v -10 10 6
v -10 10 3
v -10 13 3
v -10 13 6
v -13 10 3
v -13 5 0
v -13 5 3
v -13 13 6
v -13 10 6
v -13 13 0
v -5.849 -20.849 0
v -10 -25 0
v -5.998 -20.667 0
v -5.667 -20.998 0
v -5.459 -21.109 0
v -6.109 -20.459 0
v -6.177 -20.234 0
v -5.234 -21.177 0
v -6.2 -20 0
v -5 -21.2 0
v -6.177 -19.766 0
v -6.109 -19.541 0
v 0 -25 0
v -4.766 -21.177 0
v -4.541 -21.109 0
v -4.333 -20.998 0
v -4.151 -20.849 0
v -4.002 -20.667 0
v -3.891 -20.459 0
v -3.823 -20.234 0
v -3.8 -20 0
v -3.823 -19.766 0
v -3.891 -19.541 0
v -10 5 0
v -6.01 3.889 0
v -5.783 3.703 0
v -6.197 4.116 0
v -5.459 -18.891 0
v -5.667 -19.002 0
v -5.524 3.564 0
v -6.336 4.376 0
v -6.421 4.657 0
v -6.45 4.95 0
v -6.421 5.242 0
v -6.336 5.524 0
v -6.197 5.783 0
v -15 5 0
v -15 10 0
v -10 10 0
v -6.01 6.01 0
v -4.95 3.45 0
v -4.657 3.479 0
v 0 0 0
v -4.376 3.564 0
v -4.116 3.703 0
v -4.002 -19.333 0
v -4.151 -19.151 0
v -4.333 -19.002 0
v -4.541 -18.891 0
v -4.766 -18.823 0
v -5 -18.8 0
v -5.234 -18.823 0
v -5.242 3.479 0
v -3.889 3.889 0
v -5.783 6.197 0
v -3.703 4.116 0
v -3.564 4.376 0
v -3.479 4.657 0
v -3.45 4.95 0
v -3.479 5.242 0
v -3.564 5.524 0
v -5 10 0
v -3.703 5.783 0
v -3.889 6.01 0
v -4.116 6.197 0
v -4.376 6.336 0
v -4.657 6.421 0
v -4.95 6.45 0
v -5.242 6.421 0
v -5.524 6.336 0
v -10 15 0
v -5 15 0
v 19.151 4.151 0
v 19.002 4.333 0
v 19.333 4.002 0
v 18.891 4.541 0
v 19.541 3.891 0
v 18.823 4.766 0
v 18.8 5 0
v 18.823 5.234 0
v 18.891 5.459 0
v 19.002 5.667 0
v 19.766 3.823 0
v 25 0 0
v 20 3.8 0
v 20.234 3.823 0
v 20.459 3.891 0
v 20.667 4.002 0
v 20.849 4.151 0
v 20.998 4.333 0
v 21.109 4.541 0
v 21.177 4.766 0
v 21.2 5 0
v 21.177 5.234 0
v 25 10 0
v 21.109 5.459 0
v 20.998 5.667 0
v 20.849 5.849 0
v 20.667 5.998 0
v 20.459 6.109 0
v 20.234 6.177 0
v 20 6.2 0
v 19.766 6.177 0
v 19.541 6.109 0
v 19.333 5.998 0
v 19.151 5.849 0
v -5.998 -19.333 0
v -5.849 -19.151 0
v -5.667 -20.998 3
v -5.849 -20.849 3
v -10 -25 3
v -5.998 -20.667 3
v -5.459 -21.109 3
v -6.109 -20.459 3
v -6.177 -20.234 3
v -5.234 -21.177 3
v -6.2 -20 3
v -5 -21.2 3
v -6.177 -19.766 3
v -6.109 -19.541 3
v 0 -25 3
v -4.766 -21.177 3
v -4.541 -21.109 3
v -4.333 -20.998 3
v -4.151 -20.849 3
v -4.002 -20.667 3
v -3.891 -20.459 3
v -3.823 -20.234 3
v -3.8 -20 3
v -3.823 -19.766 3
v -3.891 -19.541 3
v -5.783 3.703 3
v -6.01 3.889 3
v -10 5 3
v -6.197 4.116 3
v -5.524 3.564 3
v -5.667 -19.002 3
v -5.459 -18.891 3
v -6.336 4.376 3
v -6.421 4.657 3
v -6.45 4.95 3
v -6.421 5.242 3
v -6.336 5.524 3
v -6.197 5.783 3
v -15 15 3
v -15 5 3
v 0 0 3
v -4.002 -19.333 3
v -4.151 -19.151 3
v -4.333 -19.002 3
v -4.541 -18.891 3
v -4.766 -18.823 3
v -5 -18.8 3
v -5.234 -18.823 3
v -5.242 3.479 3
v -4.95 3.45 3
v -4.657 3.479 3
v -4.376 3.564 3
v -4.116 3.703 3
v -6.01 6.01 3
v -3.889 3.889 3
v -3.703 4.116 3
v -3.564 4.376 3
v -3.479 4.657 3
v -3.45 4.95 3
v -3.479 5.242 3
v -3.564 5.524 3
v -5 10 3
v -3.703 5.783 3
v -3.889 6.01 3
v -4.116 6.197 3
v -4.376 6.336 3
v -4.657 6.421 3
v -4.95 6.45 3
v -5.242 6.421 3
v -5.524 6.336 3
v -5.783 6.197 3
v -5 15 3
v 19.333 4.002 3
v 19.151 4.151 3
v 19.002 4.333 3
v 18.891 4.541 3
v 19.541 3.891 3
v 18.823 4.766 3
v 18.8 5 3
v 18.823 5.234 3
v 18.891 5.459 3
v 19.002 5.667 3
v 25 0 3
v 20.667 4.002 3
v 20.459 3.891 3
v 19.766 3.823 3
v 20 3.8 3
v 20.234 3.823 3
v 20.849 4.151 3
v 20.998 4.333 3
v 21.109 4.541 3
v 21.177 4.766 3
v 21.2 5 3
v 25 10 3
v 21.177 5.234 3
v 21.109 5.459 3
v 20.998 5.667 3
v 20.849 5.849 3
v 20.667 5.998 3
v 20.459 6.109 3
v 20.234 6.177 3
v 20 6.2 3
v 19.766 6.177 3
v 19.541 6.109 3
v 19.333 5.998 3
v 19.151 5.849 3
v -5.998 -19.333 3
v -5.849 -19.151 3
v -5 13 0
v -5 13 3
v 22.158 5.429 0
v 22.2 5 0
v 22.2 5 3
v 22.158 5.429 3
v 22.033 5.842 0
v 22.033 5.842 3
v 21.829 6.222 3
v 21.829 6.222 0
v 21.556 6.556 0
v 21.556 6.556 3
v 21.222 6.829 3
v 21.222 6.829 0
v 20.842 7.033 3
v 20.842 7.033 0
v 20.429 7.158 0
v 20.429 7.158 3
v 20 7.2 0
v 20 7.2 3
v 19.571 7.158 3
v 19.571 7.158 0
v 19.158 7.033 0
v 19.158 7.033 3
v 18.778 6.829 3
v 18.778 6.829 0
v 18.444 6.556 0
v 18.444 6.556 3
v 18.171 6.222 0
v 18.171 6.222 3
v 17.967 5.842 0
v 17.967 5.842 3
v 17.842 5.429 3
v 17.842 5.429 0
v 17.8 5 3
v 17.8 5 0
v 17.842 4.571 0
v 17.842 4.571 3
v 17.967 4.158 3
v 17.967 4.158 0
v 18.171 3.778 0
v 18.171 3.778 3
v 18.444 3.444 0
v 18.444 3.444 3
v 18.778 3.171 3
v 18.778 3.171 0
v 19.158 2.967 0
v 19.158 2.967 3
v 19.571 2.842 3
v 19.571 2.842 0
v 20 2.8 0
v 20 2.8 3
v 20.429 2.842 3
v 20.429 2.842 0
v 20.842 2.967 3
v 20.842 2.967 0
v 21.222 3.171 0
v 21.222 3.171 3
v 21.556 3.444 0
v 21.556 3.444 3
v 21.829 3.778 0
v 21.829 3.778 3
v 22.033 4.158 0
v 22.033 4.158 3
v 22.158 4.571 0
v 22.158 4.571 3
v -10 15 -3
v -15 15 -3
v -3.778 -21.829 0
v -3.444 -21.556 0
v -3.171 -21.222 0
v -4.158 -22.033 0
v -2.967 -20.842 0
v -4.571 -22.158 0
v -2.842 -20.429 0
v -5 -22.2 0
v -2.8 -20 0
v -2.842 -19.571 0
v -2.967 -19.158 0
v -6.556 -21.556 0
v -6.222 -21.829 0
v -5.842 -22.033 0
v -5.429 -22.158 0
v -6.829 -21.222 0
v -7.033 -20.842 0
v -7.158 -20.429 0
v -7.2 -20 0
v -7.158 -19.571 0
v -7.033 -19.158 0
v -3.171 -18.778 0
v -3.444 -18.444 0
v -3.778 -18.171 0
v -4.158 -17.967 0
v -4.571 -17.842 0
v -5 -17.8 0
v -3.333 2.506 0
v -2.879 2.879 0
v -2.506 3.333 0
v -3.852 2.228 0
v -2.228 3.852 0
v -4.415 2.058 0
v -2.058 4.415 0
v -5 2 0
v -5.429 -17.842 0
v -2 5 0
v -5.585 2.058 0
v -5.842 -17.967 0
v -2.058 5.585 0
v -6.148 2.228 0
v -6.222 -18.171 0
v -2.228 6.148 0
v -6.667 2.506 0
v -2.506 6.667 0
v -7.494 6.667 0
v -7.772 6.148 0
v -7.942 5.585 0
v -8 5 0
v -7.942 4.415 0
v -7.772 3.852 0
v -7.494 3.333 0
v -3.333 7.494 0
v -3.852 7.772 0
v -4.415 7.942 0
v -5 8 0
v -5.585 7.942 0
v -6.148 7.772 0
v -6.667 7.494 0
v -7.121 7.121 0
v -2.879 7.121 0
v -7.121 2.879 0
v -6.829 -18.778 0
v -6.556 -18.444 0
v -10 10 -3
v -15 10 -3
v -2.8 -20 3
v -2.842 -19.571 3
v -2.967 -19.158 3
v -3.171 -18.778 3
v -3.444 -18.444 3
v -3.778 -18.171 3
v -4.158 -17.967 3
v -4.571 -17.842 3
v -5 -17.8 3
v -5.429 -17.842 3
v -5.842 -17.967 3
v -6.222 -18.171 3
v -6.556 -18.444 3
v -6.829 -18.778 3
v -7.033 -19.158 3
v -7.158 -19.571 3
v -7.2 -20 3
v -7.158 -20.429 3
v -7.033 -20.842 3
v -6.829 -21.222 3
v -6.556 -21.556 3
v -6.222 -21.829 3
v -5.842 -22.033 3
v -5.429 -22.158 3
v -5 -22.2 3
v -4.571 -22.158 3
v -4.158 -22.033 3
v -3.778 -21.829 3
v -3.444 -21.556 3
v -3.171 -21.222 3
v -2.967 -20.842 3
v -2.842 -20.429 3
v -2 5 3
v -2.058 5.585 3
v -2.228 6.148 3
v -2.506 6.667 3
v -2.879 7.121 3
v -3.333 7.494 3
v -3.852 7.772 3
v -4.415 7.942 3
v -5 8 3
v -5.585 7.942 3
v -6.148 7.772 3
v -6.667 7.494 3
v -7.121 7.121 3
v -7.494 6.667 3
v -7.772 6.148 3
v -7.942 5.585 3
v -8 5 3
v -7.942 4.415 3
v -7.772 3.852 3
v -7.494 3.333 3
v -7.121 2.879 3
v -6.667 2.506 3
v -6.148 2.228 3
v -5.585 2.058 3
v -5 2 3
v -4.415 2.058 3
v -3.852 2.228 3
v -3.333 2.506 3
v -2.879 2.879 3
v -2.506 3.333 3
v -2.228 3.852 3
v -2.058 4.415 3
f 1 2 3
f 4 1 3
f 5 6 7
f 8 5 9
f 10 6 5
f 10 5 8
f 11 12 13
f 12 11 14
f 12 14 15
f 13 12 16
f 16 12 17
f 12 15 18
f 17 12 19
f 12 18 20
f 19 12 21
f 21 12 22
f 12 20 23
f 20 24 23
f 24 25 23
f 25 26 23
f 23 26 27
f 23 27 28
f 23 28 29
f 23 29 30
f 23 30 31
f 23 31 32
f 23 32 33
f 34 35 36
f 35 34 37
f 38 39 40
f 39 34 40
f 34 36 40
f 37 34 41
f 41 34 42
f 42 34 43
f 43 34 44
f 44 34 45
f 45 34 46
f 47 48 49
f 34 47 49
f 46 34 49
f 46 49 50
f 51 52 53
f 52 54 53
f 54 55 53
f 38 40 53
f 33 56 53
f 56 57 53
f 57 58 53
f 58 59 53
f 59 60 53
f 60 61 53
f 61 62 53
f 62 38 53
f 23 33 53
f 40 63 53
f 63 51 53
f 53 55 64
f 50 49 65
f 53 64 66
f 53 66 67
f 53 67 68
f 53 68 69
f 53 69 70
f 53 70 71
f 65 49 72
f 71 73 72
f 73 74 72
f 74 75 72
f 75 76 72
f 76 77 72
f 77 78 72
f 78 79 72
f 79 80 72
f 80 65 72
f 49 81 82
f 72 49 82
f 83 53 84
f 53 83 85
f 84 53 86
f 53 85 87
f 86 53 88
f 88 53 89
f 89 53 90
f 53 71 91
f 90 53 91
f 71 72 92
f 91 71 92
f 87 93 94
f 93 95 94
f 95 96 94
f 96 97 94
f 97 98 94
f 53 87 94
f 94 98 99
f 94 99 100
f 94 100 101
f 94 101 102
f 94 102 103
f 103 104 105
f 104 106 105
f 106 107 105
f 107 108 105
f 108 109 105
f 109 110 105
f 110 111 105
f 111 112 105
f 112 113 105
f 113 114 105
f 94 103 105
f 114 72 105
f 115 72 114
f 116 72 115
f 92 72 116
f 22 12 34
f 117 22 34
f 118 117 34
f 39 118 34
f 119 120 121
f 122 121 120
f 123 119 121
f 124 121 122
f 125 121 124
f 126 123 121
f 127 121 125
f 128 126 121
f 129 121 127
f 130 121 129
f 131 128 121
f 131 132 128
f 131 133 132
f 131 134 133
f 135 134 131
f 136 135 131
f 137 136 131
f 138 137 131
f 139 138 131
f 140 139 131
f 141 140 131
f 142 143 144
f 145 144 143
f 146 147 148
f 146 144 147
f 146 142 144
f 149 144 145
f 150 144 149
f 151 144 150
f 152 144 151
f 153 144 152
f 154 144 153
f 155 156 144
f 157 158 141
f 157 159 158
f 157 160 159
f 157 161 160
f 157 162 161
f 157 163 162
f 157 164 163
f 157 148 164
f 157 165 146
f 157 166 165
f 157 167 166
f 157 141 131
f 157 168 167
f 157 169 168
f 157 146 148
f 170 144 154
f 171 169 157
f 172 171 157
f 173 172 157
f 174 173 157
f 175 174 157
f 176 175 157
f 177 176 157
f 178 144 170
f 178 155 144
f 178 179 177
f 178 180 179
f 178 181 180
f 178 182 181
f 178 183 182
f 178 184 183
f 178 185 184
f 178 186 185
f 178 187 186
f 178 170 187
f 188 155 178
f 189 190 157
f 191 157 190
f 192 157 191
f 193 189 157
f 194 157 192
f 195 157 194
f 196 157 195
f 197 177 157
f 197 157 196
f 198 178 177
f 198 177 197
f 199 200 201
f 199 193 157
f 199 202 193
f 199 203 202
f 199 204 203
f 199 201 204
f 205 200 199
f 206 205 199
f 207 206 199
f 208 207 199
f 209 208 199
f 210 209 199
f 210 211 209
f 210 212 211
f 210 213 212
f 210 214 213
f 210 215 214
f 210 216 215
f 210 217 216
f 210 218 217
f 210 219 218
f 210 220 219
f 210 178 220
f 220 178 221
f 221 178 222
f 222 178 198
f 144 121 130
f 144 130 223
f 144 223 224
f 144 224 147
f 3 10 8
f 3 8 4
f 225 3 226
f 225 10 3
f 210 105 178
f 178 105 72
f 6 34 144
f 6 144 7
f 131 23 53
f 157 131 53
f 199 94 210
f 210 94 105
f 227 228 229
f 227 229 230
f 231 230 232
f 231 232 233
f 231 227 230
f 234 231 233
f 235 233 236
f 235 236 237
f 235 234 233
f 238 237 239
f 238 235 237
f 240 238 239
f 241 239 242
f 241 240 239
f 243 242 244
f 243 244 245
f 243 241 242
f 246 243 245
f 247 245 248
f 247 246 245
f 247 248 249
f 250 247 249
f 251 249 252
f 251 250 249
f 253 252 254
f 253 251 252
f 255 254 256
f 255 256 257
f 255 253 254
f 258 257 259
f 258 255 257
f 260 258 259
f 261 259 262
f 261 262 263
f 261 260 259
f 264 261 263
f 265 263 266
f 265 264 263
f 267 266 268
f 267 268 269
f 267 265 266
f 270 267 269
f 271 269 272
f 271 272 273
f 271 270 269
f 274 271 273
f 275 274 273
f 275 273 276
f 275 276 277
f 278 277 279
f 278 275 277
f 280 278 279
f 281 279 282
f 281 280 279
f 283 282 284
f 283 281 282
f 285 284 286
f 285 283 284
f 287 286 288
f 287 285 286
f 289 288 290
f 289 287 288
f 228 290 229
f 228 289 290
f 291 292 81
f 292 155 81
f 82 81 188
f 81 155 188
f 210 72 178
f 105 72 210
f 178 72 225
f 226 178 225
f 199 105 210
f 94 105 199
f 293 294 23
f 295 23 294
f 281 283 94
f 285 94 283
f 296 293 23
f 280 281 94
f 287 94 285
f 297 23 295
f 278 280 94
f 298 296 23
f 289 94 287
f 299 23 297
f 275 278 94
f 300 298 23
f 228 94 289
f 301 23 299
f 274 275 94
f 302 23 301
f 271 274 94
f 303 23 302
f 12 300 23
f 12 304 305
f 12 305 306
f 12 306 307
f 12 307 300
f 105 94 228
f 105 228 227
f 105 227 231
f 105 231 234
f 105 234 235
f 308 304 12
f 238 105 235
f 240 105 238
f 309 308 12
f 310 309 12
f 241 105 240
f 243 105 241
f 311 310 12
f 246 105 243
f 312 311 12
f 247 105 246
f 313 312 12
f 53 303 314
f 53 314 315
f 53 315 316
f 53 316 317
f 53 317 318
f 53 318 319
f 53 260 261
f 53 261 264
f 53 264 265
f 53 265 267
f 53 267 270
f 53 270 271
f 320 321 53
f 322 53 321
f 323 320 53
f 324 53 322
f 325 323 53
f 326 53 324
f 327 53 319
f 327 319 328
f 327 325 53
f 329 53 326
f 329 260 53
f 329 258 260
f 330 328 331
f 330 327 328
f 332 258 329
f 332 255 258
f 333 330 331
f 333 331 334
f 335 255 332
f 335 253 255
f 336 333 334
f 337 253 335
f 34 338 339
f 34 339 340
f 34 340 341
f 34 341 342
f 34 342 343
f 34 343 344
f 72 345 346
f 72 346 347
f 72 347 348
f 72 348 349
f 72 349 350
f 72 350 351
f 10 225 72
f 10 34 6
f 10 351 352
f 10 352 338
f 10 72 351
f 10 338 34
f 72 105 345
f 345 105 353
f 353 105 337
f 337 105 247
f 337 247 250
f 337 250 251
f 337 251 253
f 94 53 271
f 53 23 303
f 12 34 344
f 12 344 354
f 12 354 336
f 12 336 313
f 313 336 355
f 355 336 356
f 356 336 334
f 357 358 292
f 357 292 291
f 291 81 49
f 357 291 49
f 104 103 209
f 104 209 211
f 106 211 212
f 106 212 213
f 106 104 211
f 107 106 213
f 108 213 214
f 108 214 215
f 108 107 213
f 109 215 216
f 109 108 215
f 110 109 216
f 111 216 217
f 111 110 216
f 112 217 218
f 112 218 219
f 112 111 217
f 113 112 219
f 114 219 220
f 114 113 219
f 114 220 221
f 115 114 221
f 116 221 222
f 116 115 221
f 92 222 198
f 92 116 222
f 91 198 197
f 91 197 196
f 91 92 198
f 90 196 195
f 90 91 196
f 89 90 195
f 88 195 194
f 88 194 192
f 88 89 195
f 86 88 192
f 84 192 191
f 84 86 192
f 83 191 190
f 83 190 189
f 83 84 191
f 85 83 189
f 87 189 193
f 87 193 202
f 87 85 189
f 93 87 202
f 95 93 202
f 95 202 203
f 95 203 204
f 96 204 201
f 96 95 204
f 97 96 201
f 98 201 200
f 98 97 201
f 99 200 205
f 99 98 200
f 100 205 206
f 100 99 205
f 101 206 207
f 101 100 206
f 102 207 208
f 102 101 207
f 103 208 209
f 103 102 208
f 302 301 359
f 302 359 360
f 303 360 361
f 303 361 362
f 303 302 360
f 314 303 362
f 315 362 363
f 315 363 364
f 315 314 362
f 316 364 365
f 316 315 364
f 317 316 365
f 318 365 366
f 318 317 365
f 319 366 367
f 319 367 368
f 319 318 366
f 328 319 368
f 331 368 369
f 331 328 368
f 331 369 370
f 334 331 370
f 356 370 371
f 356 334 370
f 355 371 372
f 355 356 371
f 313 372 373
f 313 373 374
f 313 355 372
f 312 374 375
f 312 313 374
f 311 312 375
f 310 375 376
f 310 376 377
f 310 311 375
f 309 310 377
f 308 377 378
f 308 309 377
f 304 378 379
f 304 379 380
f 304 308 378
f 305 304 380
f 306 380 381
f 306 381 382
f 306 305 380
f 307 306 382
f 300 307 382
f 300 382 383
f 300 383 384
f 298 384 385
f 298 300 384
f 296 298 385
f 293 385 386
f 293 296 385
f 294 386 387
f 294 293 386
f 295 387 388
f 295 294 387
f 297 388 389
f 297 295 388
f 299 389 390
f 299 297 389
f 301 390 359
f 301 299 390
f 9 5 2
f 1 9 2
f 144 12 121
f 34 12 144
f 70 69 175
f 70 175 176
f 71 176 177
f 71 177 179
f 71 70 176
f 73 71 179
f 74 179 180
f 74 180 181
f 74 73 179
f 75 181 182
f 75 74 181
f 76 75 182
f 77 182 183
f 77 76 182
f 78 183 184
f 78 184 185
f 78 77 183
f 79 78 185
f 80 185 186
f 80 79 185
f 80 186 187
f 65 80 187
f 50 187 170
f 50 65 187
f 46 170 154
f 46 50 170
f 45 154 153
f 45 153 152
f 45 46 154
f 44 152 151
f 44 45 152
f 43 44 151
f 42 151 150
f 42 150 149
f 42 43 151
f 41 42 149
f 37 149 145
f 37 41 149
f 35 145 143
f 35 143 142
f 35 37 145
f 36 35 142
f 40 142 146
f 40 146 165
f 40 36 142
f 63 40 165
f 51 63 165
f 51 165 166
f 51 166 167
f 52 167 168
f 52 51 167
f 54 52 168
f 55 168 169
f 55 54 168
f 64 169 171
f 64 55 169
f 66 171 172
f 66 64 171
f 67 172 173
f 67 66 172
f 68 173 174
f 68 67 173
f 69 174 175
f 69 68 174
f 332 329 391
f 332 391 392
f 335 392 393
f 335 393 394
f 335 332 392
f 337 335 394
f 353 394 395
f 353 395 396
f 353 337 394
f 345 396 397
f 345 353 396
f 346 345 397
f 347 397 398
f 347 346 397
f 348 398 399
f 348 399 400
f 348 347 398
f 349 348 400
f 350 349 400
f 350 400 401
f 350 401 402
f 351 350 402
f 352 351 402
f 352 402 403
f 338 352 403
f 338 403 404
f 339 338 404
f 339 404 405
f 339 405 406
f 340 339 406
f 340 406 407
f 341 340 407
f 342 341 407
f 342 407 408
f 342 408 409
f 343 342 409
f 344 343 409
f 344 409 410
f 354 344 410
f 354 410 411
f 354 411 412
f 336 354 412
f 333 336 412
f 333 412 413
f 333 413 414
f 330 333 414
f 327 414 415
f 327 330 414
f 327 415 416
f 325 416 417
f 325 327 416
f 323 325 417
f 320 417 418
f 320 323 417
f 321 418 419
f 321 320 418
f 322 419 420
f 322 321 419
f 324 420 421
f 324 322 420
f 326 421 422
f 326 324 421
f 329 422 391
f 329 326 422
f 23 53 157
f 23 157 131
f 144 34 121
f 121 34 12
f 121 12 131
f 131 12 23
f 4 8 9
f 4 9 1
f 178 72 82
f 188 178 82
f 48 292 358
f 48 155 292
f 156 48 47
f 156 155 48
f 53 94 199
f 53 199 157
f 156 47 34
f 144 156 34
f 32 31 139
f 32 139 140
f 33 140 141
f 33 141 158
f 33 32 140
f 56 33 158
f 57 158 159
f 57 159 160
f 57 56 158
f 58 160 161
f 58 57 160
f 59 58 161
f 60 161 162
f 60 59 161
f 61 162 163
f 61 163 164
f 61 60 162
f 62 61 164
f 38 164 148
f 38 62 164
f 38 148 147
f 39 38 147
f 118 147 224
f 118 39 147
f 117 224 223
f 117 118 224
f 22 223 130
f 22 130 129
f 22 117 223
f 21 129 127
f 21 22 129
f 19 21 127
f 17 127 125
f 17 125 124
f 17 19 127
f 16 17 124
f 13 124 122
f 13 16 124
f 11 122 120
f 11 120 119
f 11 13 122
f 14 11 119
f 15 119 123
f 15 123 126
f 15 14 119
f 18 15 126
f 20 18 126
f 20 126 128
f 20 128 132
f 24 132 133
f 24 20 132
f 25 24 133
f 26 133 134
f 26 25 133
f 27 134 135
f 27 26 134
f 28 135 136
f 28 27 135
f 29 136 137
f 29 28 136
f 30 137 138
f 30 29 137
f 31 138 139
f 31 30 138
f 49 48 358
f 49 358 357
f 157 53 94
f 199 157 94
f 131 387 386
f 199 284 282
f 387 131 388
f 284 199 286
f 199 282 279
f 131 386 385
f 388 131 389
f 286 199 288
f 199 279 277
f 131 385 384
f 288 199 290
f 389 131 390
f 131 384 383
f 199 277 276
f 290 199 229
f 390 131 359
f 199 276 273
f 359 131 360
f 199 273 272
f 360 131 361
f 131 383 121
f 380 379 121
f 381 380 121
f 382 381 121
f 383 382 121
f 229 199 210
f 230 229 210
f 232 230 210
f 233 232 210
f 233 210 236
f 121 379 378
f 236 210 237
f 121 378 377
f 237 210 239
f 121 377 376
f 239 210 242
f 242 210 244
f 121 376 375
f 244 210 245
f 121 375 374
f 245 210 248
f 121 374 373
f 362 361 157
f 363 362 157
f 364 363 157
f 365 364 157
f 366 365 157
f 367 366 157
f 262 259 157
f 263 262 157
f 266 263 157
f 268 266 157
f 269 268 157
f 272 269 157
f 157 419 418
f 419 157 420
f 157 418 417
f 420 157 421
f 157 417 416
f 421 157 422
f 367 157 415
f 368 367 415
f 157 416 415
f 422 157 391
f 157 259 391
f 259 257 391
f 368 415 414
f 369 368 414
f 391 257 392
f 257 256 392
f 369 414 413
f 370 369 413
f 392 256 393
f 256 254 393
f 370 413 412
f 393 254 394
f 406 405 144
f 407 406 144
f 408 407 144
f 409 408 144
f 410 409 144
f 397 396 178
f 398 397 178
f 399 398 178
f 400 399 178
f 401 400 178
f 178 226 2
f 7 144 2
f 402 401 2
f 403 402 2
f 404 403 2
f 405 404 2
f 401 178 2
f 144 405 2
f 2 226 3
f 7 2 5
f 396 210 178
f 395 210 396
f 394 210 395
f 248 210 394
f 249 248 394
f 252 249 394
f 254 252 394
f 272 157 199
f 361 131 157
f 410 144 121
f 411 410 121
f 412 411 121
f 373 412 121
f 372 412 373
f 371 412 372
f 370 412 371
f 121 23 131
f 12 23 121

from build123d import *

# Parameters (mm, degrees)
BOX002_W      = 8
BOX002_H      = 5
BOX002_DEPTH  = 3
SKETCH_R      = 3
SKETCH_R_2    = 2.2
PAD_DEPTH     = 3
BOX_W         = 3
BOX_H         = 3
BOX_DEPTH     = 6
BOX001_W      = 8
BOX001_H      = 5
BOX001_DEPTH  = 3
SKETCH001_R   = 1.5
SKETCH001_R_2 = 1.2
PAD001_DEPTH  = 3
SKETCH002_W   = 5
SKETCH002_H   = 5
PAD002_DEPTH  = 3


with BuildPart() as box002:
    # Box002 → Box002 (new body)
    with BuildSketch(Plane(origin=(-8, 5, 0), x_dir=(0, 1, 0), z_dir=(0, 0, 1))):
        with Locations((4, 2.5)):
            Rectangle(BOX002_W, BOX002_H)
    extrude(amount=BOX002_DEPTH)


with BuildPart() as body:
    # Sketch → Pad (new body)
    with BuildSketch(Plane.XY):
        Polygon((0, 0), (0, -25), (-10, -25), (-10, 10), (25, 10), (25, 0), align=None)
        with Locations((-5, 5)):
            Circle(SKETCH_R, mode=Mode.SUBTRACT)
        with Locations((20, 5)):
            Circle(SKETCH_R_2, mode=Mode.SUBTRACT)
        with Locations((-5, -20)):
            Circle(SKETCH_R_2, mode=Mode.SUBTRACT)
    extrude(amount=PAD_DEPTH)


with BuildPart() as box:
    # Box → Box (new body)
    with BuildSketch(Plane(origin=(-13, 10, 0), x_dir=(1, 0, 0), z_dir=(0, 0, 1))):
        with Locations((1.5, 1.5)):
            Rectangle(BOX_W, BOX_H)
    extrude(amount=BOX_DEPTH)


with BuildPart() as fusion002:
    # Box001 → Box001 (new body)
    with BuildSketch(Plane(origin=(-13, 8, 0), x_dir=(1, 0, 0), z_dir=(0, 0, 1))):
        with Locations((4, 2.5)):
            Rectangle(BOX001_W, BOX001_H)
    extrude(amount=BOX001_DEPTH)

    # Fusion: union Box
    add(box.part)

    # Fusion001: union Body
    add(body.part)

    # Fusion002: union Box002
    add(box002.part)


with BuildPart() as body001:
    # Sketch001 → Pad001 (new body)
    with BuildSketch(Plane.XY):
        Polygon((25, 10), (-5, 10), (-5, 15), (-15, 15), (-15, 5), (-10, 5), (-10, -25), (0, -25), (0, 0), (25, 0), align=None)
        with Locations((-4.949747, 4.949747)):
            Circle(SKETCH001_R, mode=Mode.SUBTRACT)
        with Locations((20, 5)):
            Circle(SKETCH001_R_2, mode=Mode.SUBTRACT)
        with Locations((-5, -20)):
            Circle(SKETCH001_R_2, mode=Mode.SUBTRACT)
    extrude(amount=PAD001_DEPTH)

    # Sketch002 (on Face12 of Pad001) → Pad002 (join)
    with BuildSketch(Plane(origin=(0, 0, 0), x_dir=(1, 0, 0), z_dir=(0, 0, -1))):
        with Locations((-12.5, -12.5)):
            Rectangle(SKETCH002_W, SKETCH002_H)
    extrude(amount=PAD002_DEPTH)


solid = Compound([fusion002.part, body001.part])
